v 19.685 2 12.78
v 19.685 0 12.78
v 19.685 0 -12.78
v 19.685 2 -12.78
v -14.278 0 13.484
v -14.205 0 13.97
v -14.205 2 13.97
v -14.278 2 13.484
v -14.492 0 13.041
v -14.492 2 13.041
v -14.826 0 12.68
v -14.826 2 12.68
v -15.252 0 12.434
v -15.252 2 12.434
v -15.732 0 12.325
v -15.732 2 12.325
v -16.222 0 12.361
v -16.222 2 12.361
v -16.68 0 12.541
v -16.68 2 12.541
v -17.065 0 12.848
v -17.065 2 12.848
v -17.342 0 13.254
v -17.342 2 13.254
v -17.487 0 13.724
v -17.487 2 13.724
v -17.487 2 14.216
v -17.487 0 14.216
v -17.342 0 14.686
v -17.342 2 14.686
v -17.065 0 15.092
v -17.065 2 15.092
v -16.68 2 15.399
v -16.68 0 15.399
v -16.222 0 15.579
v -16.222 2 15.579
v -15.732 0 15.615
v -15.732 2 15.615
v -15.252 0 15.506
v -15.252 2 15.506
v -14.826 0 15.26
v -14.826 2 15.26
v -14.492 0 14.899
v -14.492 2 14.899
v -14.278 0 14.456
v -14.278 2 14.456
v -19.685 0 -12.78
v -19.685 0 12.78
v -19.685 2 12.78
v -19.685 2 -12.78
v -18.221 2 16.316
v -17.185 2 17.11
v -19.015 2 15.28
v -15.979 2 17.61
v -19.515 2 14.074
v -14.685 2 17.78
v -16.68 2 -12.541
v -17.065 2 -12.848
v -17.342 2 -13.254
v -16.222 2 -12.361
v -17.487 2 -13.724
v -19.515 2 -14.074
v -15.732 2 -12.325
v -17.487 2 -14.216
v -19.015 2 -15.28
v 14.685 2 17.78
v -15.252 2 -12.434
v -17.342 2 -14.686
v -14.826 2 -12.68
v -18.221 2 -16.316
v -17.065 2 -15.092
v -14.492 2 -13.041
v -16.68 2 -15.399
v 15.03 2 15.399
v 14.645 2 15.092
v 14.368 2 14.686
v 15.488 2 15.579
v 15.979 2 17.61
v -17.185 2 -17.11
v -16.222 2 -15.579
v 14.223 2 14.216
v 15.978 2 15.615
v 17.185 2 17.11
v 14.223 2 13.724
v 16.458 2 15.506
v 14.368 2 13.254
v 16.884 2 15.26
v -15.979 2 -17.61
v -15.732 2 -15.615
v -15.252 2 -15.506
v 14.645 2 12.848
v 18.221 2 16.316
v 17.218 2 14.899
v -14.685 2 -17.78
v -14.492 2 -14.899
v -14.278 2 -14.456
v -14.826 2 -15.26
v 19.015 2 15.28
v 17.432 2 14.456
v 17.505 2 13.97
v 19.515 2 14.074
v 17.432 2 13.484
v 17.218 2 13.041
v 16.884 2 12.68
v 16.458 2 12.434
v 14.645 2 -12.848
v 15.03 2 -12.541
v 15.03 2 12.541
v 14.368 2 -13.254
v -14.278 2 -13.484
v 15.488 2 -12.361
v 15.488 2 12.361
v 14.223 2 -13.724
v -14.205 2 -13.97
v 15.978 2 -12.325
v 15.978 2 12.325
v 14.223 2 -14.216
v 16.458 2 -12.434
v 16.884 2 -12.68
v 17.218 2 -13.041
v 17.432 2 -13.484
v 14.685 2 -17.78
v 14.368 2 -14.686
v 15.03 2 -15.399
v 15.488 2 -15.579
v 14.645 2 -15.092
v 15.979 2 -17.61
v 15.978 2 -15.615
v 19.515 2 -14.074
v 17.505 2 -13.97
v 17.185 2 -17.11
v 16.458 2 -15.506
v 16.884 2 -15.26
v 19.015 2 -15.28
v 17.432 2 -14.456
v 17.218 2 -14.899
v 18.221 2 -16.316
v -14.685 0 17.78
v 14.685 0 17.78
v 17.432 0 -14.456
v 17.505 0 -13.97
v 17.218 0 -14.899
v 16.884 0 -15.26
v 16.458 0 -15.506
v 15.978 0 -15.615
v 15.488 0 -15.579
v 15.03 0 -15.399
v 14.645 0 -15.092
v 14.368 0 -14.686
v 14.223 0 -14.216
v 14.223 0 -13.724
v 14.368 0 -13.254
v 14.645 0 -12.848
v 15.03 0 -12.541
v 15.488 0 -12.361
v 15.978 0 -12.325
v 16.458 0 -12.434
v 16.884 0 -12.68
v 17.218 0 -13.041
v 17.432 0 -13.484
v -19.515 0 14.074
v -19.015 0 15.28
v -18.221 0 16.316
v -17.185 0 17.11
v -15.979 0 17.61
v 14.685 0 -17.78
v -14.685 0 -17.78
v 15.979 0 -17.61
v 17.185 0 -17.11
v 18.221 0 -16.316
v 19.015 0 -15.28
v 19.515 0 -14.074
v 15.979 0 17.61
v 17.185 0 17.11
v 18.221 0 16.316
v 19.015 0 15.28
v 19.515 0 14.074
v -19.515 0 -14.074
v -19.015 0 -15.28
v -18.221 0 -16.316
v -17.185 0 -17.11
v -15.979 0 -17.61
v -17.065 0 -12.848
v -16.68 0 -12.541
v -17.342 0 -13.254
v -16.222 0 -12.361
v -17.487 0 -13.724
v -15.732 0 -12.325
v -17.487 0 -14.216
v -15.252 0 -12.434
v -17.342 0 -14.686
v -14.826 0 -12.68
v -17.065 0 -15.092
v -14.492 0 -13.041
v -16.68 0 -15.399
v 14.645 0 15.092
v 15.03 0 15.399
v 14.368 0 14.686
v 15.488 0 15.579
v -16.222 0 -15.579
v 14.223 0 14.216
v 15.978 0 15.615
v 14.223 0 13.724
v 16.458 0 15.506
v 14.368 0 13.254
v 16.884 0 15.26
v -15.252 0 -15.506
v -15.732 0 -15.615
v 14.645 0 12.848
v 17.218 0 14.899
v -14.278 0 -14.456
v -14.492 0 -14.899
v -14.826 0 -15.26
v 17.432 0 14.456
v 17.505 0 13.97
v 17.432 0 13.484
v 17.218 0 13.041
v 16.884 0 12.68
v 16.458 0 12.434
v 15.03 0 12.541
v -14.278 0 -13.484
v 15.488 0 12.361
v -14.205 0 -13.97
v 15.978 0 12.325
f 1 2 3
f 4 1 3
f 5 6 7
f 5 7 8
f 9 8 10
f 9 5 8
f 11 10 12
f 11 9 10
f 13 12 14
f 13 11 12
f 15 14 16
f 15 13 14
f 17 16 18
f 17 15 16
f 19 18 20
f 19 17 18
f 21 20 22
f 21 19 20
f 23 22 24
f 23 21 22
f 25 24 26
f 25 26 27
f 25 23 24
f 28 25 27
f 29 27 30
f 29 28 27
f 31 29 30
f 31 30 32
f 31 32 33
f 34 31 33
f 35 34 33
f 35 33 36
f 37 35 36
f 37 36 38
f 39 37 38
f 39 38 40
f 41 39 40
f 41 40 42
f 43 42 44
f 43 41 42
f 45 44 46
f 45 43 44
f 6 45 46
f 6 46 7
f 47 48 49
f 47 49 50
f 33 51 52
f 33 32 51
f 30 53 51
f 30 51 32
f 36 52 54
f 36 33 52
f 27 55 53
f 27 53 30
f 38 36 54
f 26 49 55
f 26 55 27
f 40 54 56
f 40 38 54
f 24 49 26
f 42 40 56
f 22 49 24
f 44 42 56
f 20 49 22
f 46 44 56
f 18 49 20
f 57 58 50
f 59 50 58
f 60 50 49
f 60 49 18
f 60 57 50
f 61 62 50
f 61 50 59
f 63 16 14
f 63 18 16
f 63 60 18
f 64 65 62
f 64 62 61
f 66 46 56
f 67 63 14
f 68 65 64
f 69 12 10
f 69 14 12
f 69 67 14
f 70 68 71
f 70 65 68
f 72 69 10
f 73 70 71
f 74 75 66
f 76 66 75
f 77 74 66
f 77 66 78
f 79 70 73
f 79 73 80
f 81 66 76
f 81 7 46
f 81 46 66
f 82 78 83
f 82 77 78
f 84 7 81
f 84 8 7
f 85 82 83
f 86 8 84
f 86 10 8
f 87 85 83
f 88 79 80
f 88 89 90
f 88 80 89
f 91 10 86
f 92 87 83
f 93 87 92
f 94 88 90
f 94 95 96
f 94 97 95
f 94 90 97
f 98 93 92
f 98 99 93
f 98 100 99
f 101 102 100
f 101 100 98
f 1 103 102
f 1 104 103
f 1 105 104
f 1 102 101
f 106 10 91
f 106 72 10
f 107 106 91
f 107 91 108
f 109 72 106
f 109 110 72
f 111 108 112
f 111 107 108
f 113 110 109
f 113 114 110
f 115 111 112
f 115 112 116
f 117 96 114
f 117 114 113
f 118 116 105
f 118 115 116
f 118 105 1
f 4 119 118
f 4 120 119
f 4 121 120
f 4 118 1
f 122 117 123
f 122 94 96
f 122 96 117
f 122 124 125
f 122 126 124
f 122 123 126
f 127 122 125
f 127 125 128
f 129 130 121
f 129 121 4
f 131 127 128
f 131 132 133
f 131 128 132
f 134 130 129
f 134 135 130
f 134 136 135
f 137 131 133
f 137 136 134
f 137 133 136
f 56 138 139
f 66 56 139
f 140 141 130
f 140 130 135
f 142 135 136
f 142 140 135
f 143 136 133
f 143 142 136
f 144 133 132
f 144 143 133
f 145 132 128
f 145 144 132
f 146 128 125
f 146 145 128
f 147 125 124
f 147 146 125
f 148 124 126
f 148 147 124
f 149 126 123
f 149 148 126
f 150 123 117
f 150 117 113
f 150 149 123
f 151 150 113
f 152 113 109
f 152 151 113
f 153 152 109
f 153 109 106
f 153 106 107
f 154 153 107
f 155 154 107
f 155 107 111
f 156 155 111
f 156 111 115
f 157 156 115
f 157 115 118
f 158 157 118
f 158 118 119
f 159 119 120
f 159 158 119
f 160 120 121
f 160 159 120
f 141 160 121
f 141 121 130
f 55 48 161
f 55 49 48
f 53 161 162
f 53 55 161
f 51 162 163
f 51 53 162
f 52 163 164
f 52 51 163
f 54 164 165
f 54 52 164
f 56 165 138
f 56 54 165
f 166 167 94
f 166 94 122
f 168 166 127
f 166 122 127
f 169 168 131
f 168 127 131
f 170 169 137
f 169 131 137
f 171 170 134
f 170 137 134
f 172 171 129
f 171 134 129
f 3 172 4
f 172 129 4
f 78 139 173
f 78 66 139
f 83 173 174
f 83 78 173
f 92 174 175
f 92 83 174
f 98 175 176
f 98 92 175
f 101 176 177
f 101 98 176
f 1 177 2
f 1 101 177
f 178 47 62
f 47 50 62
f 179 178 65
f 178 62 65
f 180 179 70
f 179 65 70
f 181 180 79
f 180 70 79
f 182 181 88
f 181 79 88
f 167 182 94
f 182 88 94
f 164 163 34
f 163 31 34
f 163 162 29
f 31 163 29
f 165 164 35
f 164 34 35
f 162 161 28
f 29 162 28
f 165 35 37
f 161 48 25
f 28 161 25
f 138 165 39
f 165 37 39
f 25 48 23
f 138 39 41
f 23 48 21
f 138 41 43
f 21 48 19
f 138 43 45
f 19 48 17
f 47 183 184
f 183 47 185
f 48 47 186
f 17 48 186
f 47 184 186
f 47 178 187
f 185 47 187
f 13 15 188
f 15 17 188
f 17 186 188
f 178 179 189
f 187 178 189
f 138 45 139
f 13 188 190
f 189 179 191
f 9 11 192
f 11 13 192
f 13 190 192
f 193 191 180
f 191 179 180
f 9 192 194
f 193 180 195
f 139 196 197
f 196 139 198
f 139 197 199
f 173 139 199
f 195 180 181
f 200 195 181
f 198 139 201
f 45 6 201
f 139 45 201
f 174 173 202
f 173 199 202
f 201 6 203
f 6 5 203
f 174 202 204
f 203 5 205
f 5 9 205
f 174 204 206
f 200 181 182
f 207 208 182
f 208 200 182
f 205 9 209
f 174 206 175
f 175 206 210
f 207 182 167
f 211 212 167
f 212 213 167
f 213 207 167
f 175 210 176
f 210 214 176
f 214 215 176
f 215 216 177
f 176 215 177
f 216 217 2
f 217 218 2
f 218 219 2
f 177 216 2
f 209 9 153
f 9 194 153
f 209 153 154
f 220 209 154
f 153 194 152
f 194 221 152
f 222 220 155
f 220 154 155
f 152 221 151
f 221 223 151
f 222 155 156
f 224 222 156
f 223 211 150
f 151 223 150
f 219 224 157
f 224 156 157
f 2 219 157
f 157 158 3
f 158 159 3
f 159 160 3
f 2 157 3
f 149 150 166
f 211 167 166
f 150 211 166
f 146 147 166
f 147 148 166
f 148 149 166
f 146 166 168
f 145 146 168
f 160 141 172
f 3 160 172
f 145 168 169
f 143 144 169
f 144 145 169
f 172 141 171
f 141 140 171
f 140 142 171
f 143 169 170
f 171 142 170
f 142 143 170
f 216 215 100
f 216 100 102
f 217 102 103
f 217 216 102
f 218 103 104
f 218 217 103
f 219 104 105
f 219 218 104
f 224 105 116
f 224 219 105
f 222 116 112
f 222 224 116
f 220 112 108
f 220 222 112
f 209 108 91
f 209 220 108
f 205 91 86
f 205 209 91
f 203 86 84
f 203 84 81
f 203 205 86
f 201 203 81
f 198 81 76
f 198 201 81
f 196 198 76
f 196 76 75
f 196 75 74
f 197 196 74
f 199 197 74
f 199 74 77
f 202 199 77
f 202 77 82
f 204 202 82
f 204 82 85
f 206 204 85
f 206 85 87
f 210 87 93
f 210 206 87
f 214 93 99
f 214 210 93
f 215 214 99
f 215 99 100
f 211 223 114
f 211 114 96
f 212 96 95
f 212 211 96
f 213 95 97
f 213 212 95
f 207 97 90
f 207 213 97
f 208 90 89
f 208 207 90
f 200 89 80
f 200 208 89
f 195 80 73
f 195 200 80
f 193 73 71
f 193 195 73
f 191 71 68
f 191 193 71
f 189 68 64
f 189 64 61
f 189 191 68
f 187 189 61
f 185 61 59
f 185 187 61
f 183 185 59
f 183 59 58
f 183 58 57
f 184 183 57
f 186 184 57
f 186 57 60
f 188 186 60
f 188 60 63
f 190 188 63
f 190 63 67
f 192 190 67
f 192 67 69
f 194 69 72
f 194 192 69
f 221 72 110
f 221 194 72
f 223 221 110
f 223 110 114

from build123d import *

# Parameters (mm, degrees)
ESQUISSE1_W        = 39.37
ESQUISSE1_H        = 35.56
ESQUISSE1_R        = 1.65
BOSS_EXTRU_1_DEPTH = 2
CONG_2_R           = 5


with BuildPart() as part:
    # Esquisse1 → Boss.-Extru.1 (new body)
    with BuildSketch(Plane(origin=(0, 0, 0), x_dir=(1, 0, 0), z_dir=(0, 1, 0))):
        Rectangle(ESQUISSE1_W, ESQUISSE1_H)
        with Locations((-15.855, 13.97)):
            Circle(ESQUISSE1_R, mode=Mode.SUBTRACT)
        with Locations((15.855, 13.97)):
            Circle(ESQUISSE1_R, mode=Mode.SUBTRACT)
        with Locations((-15.855, -13.97)):
            Circle(ESQUISSE1_R, mode=Mode.SUBTRACT)
        with Locations((15.855, -13.97)):
            Circle(ESQUISSE1_R, mode=Mode.SUBTRACT)
    extrude(amount=BOSS_EXTRU_1_DEPTH)

    # Congé2
    cong_2_edges = [part.edges().sort_by_distance(p)[0] for p in [
        (19.685, 1, 17.78),
        (-19.685, 1, 17.78),
        (-19.685, 1, -17.78),
        (19.685, 1, -17.78),
    ]]
    fillet(cong_2_edges, radius=CONG_2_R)


solid = part.part
